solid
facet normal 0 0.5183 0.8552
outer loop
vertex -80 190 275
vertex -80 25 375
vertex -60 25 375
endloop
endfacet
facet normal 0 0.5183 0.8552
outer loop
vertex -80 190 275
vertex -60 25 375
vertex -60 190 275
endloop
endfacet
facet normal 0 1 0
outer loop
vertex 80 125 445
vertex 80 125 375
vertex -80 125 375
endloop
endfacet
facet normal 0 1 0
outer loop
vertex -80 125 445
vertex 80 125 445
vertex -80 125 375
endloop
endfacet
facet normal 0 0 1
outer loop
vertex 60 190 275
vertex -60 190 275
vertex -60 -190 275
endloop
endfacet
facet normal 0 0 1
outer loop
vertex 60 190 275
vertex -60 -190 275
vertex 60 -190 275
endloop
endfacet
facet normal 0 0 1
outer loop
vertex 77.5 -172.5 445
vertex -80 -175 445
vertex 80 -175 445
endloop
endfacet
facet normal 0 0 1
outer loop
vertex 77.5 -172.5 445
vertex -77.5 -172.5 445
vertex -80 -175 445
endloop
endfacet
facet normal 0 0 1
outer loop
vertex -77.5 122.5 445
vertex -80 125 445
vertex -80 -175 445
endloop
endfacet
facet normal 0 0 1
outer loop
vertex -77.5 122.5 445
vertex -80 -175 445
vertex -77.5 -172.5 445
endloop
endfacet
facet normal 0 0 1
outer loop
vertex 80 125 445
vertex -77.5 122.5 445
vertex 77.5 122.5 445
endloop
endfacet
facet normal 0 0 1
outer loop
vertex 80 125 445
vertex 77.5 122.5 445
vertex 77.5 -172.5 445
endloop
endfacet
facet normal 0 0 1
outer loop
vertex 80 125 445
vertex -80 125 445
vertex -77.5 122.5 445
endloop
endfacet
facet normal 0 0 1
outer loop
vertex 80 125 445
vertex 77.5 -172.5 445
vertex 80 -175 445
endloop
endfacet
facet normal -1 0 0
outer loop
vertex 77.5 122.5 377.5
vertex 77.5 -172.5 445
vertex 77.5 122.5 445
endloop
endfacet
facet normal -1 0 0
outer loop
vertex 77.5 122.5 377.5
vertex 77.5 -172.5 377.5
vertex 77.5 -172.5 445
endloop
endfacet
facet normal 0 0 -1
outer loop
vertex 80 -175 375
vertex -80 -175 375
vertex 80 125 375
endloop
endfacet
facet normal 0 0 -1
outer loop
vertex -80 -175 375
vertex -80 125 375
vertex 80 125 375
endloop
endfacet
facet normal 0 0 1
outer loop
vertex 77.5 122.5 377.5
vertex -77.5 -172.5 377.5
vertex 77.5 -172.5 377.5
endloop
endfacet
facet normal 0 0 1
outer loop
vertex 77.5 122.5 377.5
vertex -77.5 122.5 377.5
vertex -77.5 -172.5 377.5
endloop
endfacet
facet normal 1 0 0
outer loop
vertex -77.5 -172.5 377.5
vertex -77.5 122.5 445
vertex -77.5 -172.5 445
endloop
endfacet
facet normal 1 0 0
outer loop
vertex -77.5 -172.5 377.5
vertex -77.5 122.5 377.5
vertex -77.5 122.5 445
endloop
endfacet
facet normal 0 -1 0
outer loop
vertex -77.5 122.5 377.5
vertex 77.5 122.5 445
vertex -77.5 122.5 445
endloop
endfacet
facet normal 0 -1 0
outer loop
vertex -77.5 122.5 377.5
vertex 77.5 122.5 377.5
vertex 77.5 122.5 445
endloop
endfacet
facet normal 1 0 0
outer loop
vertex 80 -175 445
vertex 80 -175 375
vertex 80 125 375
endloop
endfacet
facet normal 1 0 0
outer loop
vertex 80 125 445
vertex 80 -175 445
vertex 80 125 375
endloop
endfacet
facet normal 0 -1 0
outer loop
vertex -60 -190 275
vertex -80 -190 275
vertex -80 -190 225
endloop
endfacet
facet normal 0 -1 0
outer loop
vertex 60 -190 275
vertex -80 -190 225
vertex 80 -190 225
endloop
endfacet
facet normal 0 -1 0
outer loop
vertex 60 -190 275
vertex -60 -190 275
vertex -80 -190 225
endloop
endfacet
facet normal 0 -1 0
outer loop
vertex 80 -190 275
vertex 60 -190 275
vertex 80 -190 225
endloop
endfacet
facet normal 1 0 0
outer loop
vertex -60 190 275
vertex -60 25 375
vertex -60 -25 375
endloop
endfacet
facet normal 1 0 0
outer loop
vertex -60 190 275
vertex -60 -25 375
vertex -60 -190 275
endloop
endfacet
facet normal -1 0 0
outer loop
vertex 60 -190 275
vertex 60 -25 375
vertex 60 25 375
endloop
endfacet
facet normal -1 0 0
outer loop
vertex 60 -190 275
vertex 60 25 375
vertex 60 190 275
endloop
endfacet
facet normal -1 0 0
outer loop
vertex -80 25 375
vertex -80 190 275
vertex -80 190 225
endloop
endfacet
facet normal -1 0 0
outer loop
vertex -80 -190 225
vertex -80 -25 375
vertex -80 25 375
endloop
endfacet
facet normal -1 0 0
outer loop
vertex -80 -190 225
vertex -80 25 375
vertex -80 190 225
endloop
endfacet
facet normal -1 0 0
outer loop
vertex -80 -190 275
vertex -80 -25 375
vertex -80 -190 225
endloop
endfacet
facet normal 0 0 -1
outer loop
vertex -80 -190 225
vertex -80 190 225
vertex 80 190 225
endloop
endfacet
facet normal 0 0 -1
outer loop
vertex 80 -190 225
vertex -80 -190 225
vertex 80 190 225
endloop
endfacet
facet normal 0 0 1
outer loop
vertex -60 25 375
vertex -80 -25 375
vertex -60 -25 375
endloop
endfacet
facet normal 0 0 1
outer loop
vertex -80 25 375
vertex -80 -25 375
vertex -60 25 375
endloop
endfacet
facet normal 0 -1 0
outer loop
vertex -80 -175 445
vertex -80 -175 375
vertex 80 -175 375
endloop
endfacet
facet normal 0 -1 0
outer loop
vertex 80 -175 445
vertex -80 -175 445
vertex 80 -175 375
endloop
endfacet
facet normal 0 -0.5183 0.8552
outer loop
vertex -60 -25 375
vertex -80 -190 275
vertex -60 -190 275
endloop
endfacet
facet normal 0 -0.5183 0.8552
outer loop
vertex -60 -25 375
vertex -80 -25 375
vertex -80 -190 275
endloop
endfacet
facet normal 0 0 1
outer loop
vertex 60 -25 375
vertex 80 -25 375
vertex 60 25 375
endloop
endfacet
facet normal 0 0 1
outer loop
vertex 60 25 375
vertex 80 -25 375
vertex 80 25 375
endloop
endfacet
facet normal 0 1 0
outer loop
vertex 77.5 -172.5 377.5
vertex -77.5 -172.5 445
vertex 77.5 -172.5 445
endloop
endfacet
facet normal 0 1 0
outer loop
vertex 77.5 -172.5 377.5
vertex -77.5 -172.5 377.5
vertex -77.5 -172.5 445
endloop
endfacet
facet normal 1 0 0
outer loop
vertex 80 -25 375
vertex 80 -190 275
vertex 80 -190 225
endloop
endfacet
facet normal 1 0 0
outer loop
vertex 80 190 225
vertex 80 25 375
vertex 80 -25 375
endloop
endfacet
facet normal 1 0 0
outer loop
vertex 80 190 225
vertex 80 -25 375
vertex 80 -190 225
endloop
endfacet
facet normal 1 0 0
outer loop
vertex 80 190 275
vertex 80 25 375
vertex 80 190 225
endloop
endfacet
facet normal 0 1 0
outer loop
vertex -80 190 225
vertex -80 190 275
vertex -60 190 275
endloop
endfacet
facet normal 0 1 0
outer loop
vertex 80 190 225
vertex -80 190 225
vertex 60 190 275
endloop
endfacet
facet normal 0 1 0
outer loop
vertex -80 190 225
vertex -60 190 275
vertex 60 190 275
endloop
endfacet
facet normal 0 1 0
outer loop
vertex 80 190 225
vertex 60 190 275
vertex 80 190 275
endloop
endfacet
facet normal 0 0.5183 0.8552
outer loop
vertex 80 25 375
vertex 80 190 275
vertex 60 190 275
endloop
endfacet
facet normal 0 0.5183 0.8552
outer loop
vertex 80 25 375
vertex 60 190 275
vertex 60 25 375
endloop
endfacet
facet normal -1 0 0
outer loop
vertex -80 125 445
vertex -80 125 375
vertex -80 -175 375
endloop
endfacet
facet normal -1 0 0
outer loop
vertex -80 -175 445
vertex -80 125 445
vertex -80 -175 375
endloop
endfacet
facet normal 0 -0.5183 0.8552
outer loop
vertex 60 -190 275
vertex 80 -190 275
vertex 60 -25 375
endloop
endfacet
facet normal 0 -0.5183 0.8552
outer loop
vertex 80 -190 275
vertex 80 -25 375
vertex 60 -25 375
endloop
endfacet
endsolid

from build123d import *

# Parameters (mm, degrees)
F1_W      = 160
F1_H      = 380
F2_DEPTH  = 50
F3_W      = 20
F3_H      = 100
F5_W      = 20
F5_H      = 50
F10_DEPTH = 70
F11_T     = -2.5
F13_DEPTH = 20
F15_DEPTH = 20


# Not quite as in the source:
# - a feature of the source that left no trace in its solid (it failed there, or was rolled back) is left out
# - a pattern or mirror of a feature is missing from the dataset's text; its kind, count and spacing are read off the source's solid


with BuildPart() as f2:
    # F1 (on offset) → F2 (new body)
    with BuildSketch(Plane.XY.offset(275)):
        Rectangle(F1_W, F1_H)
    extrude(amount=-F2_DEPTH)

    # F3 (on face) → F7 section 0
    with BuildSketch(Plane.XY.offset(275)):
        with Locations((-70, -140)):
            Rectangle(F3_W, F3_H)
    # F5 (on offset) → F7 section 1
    with BuildSketch(Plane.XY.offset(375)):
        with Locations((-70, 0)):
            Rectangle(F5_W, F5_H)
    f7 = loft()

    # F7_copies: F7 across plane
    add(f7.mirror(Plane(origin=(0, 0, 0), x_dir=(0, 0, 1), z_dir=(1, 0, 0))))

    # F12 (on face) → F13 (join)
    with BuildSketch(Plane.YZ.offset(80)):
        Polygon((25, 375), (-90, 275), (190, 275), align=None)
    extrude(amount=-F13_DEPTH)

    # F14 (on face) → F15 (join)
    with BuildSketch(Plane(origin=(-80, 0, 0), x_dir=(0, -1, 0), z_dir=(-1, 0, 0))):
        Polygon((-190, 275), (90, 275), (-25, 375), align=None)
    extrude(amount=-F15_DEPTH)


with BuildPart() as f10:
    # F9 (on face) → F10 (new body)
    with BuildSketch(Plane.XY.offset(375)):
        Polygon((-80, -175), (80, -175), (80, 125), (-80, 125), (-80, -25), align=None)
    extrude(amount=F10_DEPTH)

    # F11
    f11_openings = [f10.faces().sort_by_distance(p)[0] for p in [
        (0, -25, 445),
    ]]
    offset(amount=F11_T, openings=f11_openings)


solid = Compound([f2.part, f10.part])
